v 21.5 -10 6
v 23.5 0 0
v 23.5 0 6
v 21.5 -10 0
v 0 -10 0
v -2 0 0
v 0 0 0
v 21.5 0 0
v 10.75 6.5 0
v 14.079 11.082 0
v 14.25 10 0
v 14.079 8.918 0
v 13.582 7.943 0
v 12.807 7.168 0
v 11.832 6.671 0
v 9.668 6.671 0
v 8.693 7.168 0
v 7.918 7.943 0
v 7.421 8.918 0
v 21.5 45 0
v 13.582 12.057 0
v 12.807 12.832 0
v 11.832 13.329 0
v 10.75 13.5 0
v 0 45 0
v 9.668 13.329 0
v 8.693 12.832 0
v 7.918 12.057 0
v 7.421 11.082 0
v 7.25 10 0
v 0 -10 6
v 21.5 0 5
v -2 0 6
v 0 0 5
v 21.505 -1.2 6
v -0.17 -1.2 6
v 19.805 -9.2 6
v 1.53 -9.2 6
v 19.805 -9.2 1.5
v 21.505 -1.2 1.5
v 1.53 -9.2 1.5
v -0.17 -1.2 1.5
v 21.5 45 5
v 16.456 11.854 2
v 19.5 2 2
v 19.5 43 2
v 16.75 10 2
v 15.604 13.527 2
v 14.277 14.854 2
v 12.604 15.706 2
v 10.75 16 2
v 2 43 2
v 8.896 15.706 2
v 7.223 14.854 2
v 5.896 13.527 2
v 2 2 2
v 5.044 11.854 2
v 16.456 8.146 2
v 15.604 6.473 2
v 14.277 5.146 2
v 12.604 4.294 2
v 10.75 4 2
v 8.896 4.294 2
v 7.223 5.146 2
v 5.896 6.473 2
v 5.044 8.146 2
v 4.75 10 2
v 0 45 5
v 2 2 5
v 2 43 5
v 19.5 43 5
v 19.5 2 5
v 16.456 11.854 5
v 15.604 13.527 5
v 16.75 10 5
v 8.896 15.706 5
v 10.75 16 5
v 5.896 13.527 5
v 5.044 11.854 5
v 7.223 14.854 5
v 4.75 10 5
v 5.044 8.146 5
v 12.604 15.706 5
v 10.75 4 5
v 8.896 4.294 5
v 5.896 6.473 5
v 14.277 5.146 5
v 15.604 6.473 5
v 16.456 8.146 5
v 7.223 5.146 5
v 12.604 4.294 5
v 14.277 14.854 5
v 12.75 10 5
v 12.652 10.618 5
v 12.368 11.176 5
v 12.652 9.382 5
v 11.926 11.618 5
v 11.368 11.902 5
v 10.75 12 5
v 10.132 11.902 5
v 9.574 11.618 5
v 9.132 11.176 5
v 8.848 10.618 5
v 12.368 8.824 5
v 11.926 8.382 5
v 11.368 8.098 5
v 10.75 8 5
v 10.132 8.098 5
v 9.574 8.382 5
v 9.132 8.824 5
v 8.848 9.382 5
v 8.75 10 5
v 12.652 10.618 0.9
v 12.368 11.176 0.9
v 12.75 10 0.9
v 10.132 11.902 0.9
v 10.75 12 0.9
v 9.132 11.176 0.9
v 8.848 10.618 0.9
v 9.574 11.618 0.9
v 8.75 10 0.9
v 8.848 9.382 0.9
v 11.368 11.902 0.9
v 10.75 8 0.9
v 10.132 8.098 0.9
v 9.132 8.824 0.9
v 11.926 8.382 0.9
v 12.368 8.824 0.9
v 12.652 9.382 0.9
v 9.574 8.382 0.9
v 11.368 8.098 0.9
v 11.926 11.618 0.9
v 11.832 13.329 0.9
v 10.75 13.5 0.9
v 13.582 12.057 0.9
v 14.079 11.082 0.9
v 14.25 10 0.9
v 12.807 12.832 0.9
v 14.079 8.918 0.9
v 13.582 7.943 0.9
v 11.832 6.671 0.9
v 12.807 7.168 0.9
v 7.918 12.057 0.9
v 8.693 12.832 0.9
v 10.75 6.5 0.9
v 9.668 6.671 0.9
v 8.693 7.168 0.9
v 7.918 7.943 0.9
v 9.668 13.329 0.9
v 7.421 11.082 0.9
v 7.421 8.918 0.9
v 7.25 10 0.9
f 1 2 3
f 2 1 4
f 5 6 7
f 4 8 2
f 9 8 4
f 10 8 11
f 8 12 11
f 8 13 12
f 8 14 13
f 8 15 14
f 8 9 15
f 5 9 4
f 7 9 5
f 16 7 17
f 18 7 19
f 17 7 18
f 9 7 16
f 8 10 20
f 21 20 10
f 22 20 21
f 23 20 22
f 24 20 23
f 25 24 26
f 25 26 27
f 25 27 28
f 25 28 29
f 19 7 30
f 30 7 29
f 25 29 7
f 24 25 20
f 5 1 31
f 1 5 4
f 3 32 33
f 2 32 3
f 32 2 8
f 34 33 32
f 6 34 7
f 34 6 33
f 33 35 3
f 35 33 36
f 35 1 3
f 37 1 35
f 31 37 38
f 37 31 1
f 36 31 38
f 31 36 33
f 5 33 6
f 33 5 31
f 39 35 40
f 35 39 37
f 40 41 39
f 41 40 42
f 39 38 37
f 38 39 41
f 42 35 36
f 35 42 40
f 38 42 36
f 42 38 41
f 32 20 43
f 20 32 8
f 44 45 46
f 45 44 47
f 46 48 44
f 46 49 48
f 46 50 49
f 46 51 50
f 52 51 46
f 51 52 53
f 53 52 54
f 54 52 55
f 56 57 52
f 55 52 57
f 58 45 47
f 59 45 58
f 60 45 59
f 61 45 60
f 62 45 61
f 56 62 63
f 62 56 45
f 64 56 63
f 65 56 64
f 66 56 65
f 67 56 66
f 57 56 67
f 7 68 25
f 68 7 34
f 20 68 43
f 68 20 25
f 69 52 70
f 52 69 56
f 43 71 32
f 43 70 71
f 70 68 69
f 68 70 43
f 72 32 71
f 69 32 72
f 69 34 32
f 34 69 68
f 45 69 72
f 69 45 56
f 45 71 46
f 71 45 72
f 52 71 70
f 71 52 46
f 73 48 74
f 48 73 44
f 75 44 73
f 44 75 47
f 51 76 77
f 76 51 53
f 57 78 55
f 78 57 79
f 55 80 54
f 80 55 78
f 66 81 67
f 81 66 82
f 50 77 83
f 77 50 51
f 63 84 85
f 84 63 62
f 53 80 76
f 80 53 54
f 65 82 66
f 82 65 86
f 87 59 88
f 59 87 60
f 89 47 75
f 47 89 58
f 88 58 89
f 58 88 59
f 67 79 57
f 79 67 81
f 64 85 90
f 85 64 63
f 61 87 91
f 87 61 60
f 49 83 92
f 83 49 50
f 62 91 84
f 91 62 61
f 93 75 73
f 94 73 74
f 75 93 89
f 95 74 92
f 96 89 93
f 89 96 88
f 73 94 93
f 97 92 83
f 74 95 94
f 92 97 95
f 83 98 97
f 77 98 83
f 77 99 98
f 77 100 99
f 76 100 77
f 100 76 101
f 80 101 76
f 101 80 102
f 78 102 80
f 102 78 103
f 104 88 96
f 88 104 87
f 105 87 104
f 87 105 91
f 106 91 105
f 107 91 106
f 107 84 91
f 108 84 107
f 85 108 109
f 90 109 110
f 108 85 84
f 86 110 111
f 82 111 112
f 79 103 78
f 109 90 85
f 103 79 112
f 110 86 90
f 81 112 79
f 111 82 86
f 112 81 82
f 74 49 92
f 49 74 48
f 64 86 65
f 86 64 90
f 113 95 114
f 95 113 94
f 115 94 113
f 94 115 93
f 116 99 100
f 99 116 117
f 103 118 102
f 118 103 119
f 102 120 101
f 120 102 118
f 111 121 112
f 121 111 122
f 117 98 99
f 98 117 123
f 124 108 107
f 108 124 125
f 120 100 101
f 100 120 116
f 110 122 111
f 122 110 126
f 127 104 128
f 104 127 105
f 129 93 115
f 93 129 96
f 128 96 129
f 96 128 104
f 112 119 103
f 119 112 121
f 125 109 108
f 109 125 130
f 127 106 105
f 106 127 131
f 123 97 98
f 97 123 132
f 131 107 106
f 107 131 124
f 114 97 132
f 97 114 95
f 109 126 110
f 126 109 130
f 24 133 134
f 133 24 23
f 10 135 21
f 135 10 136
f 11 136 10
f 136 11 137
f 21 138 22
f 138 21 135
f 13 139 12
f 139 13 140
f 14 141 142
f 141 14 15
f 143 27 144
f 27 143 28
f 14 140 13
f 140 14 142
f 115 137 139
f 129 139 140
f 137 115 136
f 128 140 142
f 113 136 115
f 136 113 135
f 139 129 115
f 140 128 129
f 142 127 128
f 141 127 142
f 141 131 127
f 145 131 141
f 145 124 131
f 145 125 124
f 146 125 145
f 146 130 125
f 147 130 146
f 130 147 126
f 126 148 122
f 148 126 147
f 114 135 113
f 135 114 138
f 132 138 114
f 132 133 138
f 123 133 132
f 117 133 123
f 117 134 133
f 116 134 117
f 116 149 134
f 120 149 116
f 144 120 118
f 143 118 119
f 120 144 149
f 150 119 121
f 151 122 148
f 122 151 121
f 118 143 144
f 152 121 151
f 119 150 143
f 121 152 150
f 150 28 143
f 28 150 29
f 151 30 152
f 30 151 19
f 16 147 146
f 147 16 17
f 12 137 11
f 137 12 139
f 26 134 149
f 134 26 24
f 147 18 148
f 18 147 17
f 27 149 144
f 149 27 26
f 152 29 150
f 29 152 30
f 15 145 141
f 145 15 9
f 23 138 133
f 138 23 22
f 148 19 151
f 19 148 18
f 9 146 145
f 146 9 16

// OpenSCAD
// Al's Fridge part.
// fixing a handle


// Measurements derived from a sample part in hand

$fn = 20;
// all measurements in mm
part_width = 21.5;
part_length = 45.0;
part_height = 5;
interior_length = 33.3;
hole = 4;
part_thickness = 2;


module trappyzoid(){
linear_extrude(height=6){
polygon (points=
 [[0,0],
 [-2,0],
 [0,-10],
 [part_width,-10],
 [part_width+2,0],
 [part_width,0],
 ],convexity=10);
}
}
difference(){
  union(){
    difference(){
    trappyzoid();
    scale([0.85,0.80,1])translate([1.8,-1.5,1.5])trappyzoid();
    }
    //base
    cube([part_width,part_length,part_thickness]);
    // walls 
    cube([part_thickness,part_length,part_height]);
    cube([part_width,part_thickness,part_height]);
    translate([part_width-part_thickness,0,0])cube([part_thickness,part_length,part_height]);
    translate([0,part_length-part_thickness,0])cube([part_width,part_thickness,part_height]);
    translate([part_width/2,10,part_thickness])cylinder(h=3,r=12/2);
  }
  union(){
translate([part_width/2,10,-10])cylinder(h=25,r=4/2);
translate([part_width/2,10,-0.1])cylinder(h=1,r=7/2);
  }
}
